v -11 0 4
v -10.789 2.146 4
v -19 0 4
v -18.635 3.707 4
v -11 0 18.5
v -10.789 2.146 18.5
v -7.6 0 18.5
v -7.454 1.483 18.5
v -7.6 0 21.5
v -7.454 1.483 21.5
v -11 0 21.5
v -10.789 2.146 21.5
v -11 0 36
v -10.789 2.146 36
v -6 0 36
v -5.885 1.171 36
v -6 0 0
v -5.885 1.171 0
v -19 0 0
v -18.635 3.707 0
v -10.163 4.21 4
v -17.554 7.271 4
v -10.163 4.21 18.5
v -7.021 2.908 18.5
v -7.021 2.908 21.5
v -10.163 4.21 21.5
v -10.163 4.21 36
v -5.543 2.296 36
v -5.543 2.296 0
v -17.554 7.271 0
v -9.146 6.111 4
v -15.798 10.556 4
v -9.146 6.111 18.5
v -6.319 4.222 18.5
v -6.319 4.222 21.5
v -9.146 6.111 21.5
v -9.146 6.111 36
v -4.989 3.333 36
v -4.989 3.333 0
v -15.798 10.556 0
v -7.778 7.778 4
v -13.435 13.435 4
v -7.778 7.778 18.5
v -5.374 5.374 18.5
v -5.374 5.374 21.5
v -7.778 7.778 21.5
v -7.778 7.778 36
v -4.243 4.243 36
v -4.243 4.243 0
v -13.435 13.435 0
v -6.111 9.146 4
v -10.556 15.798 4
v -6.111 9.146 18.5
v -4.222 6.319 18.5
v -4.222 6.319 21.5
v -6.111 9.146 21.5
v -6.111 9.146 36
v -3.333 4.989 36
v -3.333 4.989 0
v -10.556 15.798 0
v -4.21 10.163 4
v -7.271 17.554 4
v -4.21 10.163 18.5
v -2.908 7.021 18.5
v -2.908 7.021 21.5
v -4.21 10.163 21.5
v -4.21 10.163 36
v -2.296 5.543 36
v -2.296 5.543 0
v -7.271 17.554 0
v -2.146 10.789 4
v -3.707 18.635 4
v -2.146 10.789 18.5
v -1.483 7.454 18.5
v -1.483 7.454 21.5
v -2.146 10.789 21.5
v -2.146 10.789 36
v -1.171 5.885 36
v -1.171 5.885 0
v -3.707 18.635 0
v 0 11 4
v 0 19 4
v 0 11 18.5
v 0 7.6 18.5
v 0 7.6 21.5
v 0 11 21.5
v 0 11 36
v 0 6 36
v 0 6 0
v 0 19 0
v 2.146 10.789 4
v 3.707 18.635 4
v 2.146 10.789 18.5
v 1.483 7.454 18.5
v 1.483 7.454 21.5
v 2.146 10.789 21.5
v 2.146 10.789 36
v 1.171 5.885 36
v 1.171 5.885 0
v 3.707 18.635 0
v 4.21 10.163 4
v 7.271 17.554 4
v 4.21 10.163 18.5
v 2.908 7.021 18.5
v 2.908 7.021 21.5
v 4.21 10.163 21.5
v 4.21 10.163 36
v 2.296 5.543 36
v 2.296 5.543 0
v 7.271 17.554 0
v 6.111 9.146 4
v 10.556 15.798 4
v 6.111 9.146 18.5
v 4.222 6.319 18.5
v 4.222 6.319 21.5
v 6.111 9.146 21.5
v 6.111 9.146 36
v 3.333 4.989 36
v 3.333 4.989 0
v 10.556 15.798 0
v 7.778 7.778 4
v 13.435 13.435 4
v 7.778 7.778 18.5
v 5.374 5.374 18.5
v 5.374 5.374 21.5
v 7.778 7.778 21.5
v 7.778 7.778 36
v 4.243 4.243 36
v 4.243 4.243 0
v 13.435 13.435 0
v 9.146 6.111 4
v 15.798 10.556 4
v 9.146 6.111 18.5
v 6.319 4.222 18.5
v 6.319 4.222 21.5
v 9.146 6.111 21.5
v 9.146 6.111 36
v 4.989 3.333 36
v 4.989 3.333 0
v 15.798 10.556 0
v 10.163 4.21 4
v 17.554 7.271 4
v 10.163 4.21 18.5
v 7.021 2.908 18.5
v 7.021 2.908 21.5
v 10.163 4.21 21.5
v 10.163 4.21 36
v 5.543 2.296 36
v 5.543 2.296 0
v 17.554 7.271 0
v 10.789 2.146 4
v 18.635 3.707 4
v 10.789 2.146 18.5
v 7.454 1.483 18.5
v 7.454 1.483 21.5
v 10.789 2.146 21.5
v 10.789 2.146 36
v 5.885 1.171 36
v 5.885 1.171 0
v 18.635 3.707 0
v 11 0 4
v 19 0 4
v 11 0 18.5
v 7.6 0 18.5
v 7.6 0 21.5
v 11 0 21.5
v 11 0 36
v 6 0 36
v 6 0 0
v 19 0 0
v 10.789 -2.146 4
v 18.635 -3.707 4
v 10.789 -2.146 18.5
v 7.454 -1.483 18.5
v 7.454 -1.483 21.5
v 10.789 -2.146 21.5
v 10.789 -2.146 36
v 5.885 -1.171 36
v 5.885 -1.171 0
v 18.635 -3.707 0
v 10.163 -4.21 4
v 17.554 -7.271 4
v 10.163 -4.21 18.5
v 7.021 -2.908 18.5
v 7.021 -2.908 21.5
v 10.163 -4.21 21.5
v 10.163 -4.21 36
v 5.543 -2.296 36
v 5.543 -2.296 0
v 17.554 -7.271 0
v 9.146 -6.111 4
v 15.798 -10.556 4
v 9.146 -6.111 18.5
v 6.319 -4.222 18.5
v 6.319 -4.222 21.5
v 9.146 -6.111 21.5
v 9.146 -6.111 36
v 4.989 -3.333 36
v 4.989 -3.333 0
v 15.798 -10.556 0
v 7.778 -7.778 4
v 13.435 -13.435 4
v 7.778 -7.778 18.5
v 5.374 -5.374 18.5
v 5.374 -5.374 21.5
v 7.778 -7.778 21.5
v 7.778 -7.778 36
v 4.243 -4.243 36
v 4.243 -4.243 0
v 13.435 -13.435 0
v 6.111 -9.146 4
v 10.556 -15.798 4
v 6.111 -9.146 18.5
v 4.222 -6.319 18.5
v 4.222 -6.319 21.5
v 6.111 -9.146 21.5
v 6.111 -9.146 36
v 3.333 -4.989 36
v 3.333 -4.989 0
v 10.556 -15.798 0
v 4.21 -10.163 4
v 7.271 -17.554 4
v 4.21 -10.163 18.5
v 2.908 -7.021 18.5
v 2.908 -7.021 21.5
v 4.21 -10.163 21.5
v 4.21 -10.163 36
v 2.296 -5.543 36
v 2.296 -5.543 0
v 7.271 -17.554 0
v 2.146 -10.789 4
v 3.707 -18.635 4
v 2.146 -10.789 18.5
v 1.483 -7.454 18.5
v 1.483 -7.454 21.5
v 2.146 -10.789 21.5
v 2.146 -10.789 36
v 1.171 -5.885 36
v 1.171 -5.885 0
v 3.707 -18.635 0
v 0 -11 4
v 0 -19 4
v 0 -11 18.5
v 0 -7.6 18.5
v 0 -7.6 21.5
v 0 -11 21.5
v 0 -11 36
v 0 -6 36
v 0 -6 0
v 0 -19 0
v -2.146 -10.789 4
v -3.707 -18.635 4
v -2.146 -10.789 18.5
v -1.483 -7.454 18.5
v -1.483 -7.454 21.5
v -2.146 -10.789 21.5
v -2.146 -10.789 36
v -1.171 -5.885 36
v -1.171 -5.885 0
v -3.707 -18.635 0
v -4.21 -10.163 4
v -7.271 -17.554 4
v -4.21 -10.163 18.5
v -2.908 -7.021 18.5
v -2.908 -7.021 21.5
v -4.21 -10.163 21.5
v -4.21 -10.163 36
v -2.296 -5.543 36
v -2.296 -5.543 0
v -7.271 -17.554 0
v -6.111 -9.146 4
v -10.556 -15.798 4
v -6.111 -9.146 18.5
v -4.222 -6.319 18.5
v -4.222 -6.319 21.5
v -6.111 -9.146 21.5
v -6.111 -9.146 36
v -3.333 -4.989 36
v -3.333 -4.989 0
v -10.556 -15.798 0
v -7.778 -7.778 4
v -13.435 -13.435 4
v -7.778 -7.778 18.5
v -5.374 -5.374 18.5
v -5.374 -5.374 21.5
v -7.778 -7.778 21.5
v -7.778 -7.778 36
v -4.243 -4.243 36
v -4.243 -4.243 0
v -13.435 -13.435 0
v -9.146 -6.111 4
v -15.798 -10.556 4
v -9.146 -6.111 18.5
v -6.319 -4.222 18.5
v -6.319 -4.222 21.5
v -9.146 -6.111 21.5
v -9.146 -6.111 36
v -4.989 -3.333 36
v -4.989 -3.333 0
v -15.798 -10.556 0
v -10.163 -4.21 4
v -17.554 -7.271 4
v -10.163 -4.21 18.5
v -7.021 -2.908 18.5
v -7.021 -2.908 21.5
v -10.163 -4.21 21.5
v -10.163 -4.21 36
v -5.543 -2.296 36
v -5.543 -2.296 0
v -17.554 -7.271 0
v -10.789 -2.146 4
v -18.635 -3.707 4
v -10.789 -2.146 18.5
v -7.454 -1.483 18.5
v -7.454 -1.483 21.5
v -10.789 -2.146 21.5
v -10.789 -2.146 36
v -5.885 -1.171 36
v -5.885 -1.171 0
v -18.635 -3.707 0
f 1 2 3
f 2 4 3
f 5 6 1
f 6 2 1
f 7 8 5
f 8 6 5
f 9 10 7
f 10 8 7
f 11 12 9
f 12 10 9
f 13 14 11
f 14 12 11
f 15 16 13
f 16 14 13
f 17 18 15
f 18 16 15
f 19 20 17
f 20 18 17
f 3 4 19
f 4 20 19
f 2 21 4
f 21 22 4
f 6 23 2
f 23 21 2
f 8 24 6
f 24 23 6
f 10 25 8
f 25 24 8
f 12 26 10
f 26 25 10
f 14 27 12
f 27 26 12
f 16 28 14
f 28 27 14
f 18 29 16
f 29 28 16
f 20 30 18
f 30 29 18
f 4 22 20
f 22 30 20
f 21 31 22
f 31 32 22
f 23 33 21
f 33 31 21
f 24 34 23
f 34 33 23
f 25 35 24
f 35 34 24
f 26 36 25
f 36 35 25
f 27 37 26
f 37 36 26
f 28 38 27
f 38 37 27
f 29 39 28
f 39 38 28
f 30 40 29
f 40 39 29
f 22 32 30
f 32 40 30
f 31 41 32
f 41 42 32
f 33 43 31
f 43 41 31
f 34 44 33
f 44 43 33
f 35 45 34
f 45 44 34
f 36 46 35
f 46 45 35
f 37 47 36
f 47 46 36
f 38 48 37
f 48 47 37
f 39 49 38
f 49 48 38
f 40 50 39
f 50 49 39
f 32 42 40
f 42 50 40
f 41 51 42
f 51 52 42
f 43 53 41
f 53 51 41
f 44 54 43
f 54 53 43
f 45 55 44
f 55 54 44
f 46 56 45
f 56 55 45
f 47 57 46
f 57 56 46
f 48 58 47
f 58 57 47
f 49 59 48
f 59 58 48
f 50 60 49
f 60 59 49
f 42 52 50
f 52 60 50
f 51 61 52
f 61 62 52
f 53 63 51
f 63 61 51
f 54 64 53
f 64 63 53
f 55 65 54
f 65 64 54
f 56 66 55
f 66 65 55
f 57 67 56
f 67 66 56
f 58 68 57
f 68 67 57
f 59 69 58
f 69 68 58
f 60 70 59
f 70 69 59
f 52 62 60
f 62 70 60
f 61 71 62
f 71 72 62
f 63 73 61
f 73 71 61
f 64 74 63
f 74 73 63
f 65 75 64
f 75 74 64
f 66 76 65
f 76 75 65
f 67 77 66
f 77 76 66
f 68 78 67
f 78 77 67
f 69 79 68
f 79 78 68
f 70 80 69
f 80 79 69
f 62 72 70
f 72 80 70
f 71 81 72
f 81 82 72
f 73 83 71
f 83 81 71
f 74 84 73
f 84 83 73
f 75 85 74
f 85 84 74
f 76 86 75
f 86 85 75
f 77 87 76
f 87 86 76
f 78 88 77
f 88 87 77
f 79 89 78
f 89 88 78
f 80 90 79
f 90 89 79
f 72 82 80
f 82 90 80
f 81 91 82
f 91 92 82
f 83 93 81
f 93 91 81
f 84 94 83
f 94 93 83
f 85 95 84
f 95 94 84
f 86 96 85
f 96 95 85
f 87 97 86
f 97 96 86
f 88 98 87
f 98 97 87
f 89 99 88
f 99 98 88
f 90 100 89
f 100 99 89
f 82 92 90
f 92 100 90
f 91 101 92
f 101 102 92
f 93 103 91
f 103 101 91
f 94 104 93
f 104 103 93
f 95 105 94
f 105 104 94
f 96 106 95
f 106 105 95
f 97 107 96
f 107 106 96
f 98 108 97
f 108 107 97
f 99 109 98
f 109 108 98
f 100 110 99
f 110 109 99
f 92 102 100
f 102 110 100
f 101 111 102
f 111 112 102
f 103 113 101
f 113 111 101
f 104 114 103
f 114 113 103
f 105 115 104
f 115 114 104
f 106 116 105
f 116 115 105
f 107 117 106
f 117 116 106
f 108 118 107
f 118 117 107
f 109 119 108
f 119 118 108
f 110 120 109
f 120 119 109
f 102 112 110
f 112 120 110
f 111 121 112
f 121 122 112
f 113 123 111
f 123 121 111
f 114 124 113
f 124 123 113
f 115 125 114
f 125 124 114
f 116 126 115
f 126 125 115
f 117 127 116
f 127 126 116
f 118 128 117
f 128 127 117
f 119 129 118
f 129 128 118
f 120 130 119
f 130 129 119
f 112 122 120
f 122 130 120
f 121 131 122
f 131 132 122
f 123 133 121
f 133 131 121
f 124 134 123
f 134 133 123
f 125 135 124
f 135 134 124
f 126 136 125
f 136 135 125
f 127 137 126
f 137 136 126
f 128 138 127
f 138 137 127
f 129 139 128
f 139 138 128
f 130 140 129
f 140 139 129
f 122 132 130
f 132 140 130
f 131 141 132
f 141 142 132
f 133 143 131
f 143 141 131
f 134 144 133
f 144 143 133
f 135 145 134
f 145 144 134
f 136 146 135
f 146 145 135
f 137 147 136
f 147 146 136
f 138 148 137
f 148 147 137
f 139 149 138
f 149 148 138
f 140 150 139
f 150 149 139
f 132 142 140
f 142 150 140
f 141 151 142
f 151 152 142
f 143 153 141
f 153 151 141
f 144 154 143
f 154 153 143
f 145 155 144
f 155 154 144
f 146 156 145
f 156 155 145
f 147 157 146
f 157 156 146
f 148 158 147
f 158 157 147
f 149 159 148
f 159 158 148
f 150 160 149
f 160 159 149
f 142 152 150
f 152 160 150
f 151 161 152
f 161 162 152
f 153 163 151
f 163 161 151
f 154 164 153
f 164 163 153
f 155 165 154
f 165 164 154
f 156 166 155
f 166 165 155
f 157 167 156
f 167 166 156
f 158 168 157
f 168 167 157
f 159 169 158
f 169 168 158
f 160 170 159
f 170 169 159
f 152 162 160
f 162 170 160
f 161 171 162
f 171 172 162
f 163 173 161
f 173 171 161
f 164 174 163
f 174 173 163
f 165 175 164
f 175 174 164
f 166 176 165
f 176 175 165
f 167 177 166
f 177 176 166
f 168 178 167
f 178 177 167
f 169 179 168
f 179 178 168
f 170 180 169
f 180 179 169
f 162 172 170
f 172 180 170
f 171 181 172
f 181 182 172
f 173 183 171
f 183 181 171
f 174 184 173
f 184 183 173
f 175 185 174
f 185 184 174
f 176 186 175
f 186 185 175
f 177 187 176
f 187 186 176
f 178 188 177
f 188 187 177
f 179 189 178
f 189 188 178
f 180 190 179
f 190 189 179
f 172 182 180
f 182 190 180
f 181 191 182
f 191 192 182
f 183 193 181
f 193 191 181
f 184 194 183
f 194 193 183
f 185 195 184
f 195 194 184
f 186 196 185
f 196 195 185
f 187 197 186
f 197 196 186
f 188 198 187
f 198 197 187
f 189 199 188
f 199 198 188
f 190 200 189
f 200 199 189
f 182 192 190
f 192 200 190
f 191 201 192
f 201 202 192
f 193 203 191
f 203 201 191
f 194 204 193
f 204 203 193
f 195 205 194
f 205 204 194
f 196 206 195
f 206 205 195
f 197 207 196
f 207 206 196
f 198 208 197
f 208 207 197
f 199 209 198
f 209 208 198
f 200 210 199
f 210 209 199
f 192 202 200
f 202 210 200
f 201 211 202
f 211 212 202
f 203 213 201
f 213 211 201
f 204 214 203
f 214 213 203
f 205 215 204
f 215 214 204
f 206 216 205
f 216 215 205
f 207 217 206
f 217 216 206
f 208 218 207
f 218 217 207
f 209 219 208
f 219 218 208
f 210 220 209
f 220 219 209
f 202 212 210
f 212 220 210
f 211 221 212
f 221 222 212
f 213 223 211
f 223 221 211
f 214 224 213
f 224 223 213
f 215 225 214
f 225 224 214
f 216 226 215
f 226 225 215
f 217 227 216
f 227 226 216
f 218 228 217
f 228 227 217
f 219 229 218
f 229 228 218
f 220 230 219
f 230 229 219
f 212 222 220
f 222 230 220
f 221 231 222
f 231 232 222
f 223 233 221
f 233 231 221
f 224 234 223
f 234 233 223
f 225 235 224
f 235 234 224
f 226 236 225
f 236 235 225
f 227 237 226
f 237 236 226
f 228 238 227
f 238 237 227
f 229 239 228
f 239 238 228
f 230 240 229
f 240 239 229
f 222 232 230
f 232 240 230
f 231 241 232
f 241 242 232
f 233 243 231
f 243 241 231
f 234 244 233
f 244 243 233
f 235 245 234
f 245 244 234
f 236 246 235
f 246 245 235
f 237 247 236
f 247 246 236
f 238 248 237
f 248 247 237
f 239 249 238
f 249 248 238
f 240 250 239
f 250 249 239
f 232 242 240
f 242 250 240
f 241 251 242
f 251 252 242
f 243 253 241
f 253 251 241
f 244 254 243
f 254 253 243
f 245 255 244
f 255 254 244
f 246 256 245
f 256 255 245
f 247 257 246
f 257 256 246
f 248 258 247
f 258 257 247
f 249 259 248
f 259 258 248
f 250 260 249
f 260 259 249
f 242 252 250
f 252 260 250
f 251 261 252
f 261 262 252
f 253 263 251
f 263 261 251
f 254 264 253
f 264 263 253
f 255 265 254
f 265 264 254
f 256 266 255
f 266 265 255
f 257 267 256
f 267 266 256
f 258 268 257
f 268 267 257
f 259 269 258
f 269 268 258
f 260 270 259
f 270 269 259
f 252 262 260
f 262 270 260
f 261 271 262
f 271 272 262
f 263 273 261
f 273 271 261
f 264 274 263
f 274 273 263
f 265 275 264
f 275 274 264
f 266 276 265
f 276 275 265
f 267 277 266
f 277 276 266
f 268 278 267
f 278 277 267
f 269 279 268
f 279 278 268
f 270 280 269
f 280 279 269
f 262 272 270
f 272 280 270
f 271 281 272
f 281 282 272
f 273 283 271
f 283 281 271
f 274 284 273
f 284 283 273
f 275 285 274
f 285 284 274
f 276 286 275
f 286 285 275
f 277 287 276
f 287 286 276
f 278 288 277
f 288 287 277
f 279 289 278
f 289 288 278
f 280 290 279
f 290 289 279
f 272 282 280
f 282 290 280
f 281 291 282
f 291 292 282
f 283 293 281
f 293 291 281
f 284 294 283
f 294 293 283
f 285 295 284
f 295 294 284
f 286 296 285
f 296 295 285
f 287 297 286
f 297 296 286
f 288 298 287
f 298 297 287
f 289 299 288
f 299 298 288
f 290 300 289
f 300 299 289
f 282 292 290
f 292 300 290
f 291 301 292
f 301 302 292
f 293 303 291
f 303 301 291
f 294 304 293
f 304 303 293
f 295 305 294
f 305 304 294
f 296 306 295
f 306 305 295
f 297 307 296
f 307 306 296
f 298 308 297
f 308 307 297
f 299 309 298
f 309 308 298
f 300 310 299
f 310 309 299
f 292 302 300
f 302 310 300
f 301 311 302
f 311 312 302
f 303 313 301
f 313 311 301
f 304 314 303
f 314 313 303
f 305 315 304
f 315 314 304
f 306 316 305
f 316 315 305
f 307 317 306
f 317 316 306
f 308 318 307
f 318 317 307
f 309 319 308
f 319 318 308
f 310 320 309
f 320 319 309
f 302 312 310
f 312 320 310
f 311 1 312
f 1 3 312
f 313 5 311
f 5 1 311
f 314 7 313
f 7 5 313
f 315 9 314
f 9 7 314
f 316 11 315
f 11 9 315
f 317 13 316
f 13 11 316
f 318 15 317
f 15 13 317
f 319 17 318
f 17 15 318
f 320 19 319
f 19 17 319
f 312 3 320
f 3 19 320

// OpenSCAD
$fn = 32;

// ----------------------------------------------------------------------
// Grooved revolve: flanged, bore R6
// ----------------------------------------------------------------------

// --- parameters (mm) ---
bore_r = 6;               // bore radius
outer_r = 11;             // outer radius of the body
total_h = 36;             // overall height, Z
wall = 5;                 // radial wall thickness
groove_w = 3;             // groove width
groove_d = 3.4;           // groove depth
grooves = 1;              // number of outer grooves
flange_r = 19;            // flange radius
flange_h = 4;             // flange height

bbox_x = 2 * flange_r;  // full diameter
bore_d = 2 * bore_r;  // bore diameter
body_d = 2 * outer_r;  // body diameter
flange_d = 2 * flange_r;  // flange diameter
revolve_angle = 360;  // full turn around the Z axis

profile = [[6, 0], [11, 0], [19, 0], [19, 4], [11, 4], [11, 18.5], [7.6, 18.5], [7.6, 21.5], [11, 21.5], [11, 36], [6, 36]];  // primary outline, 11 points, counter clockwise

// --- the one profile operation ---
rotate_extrude(angle = revolve_angle) polygon(points = profile);
